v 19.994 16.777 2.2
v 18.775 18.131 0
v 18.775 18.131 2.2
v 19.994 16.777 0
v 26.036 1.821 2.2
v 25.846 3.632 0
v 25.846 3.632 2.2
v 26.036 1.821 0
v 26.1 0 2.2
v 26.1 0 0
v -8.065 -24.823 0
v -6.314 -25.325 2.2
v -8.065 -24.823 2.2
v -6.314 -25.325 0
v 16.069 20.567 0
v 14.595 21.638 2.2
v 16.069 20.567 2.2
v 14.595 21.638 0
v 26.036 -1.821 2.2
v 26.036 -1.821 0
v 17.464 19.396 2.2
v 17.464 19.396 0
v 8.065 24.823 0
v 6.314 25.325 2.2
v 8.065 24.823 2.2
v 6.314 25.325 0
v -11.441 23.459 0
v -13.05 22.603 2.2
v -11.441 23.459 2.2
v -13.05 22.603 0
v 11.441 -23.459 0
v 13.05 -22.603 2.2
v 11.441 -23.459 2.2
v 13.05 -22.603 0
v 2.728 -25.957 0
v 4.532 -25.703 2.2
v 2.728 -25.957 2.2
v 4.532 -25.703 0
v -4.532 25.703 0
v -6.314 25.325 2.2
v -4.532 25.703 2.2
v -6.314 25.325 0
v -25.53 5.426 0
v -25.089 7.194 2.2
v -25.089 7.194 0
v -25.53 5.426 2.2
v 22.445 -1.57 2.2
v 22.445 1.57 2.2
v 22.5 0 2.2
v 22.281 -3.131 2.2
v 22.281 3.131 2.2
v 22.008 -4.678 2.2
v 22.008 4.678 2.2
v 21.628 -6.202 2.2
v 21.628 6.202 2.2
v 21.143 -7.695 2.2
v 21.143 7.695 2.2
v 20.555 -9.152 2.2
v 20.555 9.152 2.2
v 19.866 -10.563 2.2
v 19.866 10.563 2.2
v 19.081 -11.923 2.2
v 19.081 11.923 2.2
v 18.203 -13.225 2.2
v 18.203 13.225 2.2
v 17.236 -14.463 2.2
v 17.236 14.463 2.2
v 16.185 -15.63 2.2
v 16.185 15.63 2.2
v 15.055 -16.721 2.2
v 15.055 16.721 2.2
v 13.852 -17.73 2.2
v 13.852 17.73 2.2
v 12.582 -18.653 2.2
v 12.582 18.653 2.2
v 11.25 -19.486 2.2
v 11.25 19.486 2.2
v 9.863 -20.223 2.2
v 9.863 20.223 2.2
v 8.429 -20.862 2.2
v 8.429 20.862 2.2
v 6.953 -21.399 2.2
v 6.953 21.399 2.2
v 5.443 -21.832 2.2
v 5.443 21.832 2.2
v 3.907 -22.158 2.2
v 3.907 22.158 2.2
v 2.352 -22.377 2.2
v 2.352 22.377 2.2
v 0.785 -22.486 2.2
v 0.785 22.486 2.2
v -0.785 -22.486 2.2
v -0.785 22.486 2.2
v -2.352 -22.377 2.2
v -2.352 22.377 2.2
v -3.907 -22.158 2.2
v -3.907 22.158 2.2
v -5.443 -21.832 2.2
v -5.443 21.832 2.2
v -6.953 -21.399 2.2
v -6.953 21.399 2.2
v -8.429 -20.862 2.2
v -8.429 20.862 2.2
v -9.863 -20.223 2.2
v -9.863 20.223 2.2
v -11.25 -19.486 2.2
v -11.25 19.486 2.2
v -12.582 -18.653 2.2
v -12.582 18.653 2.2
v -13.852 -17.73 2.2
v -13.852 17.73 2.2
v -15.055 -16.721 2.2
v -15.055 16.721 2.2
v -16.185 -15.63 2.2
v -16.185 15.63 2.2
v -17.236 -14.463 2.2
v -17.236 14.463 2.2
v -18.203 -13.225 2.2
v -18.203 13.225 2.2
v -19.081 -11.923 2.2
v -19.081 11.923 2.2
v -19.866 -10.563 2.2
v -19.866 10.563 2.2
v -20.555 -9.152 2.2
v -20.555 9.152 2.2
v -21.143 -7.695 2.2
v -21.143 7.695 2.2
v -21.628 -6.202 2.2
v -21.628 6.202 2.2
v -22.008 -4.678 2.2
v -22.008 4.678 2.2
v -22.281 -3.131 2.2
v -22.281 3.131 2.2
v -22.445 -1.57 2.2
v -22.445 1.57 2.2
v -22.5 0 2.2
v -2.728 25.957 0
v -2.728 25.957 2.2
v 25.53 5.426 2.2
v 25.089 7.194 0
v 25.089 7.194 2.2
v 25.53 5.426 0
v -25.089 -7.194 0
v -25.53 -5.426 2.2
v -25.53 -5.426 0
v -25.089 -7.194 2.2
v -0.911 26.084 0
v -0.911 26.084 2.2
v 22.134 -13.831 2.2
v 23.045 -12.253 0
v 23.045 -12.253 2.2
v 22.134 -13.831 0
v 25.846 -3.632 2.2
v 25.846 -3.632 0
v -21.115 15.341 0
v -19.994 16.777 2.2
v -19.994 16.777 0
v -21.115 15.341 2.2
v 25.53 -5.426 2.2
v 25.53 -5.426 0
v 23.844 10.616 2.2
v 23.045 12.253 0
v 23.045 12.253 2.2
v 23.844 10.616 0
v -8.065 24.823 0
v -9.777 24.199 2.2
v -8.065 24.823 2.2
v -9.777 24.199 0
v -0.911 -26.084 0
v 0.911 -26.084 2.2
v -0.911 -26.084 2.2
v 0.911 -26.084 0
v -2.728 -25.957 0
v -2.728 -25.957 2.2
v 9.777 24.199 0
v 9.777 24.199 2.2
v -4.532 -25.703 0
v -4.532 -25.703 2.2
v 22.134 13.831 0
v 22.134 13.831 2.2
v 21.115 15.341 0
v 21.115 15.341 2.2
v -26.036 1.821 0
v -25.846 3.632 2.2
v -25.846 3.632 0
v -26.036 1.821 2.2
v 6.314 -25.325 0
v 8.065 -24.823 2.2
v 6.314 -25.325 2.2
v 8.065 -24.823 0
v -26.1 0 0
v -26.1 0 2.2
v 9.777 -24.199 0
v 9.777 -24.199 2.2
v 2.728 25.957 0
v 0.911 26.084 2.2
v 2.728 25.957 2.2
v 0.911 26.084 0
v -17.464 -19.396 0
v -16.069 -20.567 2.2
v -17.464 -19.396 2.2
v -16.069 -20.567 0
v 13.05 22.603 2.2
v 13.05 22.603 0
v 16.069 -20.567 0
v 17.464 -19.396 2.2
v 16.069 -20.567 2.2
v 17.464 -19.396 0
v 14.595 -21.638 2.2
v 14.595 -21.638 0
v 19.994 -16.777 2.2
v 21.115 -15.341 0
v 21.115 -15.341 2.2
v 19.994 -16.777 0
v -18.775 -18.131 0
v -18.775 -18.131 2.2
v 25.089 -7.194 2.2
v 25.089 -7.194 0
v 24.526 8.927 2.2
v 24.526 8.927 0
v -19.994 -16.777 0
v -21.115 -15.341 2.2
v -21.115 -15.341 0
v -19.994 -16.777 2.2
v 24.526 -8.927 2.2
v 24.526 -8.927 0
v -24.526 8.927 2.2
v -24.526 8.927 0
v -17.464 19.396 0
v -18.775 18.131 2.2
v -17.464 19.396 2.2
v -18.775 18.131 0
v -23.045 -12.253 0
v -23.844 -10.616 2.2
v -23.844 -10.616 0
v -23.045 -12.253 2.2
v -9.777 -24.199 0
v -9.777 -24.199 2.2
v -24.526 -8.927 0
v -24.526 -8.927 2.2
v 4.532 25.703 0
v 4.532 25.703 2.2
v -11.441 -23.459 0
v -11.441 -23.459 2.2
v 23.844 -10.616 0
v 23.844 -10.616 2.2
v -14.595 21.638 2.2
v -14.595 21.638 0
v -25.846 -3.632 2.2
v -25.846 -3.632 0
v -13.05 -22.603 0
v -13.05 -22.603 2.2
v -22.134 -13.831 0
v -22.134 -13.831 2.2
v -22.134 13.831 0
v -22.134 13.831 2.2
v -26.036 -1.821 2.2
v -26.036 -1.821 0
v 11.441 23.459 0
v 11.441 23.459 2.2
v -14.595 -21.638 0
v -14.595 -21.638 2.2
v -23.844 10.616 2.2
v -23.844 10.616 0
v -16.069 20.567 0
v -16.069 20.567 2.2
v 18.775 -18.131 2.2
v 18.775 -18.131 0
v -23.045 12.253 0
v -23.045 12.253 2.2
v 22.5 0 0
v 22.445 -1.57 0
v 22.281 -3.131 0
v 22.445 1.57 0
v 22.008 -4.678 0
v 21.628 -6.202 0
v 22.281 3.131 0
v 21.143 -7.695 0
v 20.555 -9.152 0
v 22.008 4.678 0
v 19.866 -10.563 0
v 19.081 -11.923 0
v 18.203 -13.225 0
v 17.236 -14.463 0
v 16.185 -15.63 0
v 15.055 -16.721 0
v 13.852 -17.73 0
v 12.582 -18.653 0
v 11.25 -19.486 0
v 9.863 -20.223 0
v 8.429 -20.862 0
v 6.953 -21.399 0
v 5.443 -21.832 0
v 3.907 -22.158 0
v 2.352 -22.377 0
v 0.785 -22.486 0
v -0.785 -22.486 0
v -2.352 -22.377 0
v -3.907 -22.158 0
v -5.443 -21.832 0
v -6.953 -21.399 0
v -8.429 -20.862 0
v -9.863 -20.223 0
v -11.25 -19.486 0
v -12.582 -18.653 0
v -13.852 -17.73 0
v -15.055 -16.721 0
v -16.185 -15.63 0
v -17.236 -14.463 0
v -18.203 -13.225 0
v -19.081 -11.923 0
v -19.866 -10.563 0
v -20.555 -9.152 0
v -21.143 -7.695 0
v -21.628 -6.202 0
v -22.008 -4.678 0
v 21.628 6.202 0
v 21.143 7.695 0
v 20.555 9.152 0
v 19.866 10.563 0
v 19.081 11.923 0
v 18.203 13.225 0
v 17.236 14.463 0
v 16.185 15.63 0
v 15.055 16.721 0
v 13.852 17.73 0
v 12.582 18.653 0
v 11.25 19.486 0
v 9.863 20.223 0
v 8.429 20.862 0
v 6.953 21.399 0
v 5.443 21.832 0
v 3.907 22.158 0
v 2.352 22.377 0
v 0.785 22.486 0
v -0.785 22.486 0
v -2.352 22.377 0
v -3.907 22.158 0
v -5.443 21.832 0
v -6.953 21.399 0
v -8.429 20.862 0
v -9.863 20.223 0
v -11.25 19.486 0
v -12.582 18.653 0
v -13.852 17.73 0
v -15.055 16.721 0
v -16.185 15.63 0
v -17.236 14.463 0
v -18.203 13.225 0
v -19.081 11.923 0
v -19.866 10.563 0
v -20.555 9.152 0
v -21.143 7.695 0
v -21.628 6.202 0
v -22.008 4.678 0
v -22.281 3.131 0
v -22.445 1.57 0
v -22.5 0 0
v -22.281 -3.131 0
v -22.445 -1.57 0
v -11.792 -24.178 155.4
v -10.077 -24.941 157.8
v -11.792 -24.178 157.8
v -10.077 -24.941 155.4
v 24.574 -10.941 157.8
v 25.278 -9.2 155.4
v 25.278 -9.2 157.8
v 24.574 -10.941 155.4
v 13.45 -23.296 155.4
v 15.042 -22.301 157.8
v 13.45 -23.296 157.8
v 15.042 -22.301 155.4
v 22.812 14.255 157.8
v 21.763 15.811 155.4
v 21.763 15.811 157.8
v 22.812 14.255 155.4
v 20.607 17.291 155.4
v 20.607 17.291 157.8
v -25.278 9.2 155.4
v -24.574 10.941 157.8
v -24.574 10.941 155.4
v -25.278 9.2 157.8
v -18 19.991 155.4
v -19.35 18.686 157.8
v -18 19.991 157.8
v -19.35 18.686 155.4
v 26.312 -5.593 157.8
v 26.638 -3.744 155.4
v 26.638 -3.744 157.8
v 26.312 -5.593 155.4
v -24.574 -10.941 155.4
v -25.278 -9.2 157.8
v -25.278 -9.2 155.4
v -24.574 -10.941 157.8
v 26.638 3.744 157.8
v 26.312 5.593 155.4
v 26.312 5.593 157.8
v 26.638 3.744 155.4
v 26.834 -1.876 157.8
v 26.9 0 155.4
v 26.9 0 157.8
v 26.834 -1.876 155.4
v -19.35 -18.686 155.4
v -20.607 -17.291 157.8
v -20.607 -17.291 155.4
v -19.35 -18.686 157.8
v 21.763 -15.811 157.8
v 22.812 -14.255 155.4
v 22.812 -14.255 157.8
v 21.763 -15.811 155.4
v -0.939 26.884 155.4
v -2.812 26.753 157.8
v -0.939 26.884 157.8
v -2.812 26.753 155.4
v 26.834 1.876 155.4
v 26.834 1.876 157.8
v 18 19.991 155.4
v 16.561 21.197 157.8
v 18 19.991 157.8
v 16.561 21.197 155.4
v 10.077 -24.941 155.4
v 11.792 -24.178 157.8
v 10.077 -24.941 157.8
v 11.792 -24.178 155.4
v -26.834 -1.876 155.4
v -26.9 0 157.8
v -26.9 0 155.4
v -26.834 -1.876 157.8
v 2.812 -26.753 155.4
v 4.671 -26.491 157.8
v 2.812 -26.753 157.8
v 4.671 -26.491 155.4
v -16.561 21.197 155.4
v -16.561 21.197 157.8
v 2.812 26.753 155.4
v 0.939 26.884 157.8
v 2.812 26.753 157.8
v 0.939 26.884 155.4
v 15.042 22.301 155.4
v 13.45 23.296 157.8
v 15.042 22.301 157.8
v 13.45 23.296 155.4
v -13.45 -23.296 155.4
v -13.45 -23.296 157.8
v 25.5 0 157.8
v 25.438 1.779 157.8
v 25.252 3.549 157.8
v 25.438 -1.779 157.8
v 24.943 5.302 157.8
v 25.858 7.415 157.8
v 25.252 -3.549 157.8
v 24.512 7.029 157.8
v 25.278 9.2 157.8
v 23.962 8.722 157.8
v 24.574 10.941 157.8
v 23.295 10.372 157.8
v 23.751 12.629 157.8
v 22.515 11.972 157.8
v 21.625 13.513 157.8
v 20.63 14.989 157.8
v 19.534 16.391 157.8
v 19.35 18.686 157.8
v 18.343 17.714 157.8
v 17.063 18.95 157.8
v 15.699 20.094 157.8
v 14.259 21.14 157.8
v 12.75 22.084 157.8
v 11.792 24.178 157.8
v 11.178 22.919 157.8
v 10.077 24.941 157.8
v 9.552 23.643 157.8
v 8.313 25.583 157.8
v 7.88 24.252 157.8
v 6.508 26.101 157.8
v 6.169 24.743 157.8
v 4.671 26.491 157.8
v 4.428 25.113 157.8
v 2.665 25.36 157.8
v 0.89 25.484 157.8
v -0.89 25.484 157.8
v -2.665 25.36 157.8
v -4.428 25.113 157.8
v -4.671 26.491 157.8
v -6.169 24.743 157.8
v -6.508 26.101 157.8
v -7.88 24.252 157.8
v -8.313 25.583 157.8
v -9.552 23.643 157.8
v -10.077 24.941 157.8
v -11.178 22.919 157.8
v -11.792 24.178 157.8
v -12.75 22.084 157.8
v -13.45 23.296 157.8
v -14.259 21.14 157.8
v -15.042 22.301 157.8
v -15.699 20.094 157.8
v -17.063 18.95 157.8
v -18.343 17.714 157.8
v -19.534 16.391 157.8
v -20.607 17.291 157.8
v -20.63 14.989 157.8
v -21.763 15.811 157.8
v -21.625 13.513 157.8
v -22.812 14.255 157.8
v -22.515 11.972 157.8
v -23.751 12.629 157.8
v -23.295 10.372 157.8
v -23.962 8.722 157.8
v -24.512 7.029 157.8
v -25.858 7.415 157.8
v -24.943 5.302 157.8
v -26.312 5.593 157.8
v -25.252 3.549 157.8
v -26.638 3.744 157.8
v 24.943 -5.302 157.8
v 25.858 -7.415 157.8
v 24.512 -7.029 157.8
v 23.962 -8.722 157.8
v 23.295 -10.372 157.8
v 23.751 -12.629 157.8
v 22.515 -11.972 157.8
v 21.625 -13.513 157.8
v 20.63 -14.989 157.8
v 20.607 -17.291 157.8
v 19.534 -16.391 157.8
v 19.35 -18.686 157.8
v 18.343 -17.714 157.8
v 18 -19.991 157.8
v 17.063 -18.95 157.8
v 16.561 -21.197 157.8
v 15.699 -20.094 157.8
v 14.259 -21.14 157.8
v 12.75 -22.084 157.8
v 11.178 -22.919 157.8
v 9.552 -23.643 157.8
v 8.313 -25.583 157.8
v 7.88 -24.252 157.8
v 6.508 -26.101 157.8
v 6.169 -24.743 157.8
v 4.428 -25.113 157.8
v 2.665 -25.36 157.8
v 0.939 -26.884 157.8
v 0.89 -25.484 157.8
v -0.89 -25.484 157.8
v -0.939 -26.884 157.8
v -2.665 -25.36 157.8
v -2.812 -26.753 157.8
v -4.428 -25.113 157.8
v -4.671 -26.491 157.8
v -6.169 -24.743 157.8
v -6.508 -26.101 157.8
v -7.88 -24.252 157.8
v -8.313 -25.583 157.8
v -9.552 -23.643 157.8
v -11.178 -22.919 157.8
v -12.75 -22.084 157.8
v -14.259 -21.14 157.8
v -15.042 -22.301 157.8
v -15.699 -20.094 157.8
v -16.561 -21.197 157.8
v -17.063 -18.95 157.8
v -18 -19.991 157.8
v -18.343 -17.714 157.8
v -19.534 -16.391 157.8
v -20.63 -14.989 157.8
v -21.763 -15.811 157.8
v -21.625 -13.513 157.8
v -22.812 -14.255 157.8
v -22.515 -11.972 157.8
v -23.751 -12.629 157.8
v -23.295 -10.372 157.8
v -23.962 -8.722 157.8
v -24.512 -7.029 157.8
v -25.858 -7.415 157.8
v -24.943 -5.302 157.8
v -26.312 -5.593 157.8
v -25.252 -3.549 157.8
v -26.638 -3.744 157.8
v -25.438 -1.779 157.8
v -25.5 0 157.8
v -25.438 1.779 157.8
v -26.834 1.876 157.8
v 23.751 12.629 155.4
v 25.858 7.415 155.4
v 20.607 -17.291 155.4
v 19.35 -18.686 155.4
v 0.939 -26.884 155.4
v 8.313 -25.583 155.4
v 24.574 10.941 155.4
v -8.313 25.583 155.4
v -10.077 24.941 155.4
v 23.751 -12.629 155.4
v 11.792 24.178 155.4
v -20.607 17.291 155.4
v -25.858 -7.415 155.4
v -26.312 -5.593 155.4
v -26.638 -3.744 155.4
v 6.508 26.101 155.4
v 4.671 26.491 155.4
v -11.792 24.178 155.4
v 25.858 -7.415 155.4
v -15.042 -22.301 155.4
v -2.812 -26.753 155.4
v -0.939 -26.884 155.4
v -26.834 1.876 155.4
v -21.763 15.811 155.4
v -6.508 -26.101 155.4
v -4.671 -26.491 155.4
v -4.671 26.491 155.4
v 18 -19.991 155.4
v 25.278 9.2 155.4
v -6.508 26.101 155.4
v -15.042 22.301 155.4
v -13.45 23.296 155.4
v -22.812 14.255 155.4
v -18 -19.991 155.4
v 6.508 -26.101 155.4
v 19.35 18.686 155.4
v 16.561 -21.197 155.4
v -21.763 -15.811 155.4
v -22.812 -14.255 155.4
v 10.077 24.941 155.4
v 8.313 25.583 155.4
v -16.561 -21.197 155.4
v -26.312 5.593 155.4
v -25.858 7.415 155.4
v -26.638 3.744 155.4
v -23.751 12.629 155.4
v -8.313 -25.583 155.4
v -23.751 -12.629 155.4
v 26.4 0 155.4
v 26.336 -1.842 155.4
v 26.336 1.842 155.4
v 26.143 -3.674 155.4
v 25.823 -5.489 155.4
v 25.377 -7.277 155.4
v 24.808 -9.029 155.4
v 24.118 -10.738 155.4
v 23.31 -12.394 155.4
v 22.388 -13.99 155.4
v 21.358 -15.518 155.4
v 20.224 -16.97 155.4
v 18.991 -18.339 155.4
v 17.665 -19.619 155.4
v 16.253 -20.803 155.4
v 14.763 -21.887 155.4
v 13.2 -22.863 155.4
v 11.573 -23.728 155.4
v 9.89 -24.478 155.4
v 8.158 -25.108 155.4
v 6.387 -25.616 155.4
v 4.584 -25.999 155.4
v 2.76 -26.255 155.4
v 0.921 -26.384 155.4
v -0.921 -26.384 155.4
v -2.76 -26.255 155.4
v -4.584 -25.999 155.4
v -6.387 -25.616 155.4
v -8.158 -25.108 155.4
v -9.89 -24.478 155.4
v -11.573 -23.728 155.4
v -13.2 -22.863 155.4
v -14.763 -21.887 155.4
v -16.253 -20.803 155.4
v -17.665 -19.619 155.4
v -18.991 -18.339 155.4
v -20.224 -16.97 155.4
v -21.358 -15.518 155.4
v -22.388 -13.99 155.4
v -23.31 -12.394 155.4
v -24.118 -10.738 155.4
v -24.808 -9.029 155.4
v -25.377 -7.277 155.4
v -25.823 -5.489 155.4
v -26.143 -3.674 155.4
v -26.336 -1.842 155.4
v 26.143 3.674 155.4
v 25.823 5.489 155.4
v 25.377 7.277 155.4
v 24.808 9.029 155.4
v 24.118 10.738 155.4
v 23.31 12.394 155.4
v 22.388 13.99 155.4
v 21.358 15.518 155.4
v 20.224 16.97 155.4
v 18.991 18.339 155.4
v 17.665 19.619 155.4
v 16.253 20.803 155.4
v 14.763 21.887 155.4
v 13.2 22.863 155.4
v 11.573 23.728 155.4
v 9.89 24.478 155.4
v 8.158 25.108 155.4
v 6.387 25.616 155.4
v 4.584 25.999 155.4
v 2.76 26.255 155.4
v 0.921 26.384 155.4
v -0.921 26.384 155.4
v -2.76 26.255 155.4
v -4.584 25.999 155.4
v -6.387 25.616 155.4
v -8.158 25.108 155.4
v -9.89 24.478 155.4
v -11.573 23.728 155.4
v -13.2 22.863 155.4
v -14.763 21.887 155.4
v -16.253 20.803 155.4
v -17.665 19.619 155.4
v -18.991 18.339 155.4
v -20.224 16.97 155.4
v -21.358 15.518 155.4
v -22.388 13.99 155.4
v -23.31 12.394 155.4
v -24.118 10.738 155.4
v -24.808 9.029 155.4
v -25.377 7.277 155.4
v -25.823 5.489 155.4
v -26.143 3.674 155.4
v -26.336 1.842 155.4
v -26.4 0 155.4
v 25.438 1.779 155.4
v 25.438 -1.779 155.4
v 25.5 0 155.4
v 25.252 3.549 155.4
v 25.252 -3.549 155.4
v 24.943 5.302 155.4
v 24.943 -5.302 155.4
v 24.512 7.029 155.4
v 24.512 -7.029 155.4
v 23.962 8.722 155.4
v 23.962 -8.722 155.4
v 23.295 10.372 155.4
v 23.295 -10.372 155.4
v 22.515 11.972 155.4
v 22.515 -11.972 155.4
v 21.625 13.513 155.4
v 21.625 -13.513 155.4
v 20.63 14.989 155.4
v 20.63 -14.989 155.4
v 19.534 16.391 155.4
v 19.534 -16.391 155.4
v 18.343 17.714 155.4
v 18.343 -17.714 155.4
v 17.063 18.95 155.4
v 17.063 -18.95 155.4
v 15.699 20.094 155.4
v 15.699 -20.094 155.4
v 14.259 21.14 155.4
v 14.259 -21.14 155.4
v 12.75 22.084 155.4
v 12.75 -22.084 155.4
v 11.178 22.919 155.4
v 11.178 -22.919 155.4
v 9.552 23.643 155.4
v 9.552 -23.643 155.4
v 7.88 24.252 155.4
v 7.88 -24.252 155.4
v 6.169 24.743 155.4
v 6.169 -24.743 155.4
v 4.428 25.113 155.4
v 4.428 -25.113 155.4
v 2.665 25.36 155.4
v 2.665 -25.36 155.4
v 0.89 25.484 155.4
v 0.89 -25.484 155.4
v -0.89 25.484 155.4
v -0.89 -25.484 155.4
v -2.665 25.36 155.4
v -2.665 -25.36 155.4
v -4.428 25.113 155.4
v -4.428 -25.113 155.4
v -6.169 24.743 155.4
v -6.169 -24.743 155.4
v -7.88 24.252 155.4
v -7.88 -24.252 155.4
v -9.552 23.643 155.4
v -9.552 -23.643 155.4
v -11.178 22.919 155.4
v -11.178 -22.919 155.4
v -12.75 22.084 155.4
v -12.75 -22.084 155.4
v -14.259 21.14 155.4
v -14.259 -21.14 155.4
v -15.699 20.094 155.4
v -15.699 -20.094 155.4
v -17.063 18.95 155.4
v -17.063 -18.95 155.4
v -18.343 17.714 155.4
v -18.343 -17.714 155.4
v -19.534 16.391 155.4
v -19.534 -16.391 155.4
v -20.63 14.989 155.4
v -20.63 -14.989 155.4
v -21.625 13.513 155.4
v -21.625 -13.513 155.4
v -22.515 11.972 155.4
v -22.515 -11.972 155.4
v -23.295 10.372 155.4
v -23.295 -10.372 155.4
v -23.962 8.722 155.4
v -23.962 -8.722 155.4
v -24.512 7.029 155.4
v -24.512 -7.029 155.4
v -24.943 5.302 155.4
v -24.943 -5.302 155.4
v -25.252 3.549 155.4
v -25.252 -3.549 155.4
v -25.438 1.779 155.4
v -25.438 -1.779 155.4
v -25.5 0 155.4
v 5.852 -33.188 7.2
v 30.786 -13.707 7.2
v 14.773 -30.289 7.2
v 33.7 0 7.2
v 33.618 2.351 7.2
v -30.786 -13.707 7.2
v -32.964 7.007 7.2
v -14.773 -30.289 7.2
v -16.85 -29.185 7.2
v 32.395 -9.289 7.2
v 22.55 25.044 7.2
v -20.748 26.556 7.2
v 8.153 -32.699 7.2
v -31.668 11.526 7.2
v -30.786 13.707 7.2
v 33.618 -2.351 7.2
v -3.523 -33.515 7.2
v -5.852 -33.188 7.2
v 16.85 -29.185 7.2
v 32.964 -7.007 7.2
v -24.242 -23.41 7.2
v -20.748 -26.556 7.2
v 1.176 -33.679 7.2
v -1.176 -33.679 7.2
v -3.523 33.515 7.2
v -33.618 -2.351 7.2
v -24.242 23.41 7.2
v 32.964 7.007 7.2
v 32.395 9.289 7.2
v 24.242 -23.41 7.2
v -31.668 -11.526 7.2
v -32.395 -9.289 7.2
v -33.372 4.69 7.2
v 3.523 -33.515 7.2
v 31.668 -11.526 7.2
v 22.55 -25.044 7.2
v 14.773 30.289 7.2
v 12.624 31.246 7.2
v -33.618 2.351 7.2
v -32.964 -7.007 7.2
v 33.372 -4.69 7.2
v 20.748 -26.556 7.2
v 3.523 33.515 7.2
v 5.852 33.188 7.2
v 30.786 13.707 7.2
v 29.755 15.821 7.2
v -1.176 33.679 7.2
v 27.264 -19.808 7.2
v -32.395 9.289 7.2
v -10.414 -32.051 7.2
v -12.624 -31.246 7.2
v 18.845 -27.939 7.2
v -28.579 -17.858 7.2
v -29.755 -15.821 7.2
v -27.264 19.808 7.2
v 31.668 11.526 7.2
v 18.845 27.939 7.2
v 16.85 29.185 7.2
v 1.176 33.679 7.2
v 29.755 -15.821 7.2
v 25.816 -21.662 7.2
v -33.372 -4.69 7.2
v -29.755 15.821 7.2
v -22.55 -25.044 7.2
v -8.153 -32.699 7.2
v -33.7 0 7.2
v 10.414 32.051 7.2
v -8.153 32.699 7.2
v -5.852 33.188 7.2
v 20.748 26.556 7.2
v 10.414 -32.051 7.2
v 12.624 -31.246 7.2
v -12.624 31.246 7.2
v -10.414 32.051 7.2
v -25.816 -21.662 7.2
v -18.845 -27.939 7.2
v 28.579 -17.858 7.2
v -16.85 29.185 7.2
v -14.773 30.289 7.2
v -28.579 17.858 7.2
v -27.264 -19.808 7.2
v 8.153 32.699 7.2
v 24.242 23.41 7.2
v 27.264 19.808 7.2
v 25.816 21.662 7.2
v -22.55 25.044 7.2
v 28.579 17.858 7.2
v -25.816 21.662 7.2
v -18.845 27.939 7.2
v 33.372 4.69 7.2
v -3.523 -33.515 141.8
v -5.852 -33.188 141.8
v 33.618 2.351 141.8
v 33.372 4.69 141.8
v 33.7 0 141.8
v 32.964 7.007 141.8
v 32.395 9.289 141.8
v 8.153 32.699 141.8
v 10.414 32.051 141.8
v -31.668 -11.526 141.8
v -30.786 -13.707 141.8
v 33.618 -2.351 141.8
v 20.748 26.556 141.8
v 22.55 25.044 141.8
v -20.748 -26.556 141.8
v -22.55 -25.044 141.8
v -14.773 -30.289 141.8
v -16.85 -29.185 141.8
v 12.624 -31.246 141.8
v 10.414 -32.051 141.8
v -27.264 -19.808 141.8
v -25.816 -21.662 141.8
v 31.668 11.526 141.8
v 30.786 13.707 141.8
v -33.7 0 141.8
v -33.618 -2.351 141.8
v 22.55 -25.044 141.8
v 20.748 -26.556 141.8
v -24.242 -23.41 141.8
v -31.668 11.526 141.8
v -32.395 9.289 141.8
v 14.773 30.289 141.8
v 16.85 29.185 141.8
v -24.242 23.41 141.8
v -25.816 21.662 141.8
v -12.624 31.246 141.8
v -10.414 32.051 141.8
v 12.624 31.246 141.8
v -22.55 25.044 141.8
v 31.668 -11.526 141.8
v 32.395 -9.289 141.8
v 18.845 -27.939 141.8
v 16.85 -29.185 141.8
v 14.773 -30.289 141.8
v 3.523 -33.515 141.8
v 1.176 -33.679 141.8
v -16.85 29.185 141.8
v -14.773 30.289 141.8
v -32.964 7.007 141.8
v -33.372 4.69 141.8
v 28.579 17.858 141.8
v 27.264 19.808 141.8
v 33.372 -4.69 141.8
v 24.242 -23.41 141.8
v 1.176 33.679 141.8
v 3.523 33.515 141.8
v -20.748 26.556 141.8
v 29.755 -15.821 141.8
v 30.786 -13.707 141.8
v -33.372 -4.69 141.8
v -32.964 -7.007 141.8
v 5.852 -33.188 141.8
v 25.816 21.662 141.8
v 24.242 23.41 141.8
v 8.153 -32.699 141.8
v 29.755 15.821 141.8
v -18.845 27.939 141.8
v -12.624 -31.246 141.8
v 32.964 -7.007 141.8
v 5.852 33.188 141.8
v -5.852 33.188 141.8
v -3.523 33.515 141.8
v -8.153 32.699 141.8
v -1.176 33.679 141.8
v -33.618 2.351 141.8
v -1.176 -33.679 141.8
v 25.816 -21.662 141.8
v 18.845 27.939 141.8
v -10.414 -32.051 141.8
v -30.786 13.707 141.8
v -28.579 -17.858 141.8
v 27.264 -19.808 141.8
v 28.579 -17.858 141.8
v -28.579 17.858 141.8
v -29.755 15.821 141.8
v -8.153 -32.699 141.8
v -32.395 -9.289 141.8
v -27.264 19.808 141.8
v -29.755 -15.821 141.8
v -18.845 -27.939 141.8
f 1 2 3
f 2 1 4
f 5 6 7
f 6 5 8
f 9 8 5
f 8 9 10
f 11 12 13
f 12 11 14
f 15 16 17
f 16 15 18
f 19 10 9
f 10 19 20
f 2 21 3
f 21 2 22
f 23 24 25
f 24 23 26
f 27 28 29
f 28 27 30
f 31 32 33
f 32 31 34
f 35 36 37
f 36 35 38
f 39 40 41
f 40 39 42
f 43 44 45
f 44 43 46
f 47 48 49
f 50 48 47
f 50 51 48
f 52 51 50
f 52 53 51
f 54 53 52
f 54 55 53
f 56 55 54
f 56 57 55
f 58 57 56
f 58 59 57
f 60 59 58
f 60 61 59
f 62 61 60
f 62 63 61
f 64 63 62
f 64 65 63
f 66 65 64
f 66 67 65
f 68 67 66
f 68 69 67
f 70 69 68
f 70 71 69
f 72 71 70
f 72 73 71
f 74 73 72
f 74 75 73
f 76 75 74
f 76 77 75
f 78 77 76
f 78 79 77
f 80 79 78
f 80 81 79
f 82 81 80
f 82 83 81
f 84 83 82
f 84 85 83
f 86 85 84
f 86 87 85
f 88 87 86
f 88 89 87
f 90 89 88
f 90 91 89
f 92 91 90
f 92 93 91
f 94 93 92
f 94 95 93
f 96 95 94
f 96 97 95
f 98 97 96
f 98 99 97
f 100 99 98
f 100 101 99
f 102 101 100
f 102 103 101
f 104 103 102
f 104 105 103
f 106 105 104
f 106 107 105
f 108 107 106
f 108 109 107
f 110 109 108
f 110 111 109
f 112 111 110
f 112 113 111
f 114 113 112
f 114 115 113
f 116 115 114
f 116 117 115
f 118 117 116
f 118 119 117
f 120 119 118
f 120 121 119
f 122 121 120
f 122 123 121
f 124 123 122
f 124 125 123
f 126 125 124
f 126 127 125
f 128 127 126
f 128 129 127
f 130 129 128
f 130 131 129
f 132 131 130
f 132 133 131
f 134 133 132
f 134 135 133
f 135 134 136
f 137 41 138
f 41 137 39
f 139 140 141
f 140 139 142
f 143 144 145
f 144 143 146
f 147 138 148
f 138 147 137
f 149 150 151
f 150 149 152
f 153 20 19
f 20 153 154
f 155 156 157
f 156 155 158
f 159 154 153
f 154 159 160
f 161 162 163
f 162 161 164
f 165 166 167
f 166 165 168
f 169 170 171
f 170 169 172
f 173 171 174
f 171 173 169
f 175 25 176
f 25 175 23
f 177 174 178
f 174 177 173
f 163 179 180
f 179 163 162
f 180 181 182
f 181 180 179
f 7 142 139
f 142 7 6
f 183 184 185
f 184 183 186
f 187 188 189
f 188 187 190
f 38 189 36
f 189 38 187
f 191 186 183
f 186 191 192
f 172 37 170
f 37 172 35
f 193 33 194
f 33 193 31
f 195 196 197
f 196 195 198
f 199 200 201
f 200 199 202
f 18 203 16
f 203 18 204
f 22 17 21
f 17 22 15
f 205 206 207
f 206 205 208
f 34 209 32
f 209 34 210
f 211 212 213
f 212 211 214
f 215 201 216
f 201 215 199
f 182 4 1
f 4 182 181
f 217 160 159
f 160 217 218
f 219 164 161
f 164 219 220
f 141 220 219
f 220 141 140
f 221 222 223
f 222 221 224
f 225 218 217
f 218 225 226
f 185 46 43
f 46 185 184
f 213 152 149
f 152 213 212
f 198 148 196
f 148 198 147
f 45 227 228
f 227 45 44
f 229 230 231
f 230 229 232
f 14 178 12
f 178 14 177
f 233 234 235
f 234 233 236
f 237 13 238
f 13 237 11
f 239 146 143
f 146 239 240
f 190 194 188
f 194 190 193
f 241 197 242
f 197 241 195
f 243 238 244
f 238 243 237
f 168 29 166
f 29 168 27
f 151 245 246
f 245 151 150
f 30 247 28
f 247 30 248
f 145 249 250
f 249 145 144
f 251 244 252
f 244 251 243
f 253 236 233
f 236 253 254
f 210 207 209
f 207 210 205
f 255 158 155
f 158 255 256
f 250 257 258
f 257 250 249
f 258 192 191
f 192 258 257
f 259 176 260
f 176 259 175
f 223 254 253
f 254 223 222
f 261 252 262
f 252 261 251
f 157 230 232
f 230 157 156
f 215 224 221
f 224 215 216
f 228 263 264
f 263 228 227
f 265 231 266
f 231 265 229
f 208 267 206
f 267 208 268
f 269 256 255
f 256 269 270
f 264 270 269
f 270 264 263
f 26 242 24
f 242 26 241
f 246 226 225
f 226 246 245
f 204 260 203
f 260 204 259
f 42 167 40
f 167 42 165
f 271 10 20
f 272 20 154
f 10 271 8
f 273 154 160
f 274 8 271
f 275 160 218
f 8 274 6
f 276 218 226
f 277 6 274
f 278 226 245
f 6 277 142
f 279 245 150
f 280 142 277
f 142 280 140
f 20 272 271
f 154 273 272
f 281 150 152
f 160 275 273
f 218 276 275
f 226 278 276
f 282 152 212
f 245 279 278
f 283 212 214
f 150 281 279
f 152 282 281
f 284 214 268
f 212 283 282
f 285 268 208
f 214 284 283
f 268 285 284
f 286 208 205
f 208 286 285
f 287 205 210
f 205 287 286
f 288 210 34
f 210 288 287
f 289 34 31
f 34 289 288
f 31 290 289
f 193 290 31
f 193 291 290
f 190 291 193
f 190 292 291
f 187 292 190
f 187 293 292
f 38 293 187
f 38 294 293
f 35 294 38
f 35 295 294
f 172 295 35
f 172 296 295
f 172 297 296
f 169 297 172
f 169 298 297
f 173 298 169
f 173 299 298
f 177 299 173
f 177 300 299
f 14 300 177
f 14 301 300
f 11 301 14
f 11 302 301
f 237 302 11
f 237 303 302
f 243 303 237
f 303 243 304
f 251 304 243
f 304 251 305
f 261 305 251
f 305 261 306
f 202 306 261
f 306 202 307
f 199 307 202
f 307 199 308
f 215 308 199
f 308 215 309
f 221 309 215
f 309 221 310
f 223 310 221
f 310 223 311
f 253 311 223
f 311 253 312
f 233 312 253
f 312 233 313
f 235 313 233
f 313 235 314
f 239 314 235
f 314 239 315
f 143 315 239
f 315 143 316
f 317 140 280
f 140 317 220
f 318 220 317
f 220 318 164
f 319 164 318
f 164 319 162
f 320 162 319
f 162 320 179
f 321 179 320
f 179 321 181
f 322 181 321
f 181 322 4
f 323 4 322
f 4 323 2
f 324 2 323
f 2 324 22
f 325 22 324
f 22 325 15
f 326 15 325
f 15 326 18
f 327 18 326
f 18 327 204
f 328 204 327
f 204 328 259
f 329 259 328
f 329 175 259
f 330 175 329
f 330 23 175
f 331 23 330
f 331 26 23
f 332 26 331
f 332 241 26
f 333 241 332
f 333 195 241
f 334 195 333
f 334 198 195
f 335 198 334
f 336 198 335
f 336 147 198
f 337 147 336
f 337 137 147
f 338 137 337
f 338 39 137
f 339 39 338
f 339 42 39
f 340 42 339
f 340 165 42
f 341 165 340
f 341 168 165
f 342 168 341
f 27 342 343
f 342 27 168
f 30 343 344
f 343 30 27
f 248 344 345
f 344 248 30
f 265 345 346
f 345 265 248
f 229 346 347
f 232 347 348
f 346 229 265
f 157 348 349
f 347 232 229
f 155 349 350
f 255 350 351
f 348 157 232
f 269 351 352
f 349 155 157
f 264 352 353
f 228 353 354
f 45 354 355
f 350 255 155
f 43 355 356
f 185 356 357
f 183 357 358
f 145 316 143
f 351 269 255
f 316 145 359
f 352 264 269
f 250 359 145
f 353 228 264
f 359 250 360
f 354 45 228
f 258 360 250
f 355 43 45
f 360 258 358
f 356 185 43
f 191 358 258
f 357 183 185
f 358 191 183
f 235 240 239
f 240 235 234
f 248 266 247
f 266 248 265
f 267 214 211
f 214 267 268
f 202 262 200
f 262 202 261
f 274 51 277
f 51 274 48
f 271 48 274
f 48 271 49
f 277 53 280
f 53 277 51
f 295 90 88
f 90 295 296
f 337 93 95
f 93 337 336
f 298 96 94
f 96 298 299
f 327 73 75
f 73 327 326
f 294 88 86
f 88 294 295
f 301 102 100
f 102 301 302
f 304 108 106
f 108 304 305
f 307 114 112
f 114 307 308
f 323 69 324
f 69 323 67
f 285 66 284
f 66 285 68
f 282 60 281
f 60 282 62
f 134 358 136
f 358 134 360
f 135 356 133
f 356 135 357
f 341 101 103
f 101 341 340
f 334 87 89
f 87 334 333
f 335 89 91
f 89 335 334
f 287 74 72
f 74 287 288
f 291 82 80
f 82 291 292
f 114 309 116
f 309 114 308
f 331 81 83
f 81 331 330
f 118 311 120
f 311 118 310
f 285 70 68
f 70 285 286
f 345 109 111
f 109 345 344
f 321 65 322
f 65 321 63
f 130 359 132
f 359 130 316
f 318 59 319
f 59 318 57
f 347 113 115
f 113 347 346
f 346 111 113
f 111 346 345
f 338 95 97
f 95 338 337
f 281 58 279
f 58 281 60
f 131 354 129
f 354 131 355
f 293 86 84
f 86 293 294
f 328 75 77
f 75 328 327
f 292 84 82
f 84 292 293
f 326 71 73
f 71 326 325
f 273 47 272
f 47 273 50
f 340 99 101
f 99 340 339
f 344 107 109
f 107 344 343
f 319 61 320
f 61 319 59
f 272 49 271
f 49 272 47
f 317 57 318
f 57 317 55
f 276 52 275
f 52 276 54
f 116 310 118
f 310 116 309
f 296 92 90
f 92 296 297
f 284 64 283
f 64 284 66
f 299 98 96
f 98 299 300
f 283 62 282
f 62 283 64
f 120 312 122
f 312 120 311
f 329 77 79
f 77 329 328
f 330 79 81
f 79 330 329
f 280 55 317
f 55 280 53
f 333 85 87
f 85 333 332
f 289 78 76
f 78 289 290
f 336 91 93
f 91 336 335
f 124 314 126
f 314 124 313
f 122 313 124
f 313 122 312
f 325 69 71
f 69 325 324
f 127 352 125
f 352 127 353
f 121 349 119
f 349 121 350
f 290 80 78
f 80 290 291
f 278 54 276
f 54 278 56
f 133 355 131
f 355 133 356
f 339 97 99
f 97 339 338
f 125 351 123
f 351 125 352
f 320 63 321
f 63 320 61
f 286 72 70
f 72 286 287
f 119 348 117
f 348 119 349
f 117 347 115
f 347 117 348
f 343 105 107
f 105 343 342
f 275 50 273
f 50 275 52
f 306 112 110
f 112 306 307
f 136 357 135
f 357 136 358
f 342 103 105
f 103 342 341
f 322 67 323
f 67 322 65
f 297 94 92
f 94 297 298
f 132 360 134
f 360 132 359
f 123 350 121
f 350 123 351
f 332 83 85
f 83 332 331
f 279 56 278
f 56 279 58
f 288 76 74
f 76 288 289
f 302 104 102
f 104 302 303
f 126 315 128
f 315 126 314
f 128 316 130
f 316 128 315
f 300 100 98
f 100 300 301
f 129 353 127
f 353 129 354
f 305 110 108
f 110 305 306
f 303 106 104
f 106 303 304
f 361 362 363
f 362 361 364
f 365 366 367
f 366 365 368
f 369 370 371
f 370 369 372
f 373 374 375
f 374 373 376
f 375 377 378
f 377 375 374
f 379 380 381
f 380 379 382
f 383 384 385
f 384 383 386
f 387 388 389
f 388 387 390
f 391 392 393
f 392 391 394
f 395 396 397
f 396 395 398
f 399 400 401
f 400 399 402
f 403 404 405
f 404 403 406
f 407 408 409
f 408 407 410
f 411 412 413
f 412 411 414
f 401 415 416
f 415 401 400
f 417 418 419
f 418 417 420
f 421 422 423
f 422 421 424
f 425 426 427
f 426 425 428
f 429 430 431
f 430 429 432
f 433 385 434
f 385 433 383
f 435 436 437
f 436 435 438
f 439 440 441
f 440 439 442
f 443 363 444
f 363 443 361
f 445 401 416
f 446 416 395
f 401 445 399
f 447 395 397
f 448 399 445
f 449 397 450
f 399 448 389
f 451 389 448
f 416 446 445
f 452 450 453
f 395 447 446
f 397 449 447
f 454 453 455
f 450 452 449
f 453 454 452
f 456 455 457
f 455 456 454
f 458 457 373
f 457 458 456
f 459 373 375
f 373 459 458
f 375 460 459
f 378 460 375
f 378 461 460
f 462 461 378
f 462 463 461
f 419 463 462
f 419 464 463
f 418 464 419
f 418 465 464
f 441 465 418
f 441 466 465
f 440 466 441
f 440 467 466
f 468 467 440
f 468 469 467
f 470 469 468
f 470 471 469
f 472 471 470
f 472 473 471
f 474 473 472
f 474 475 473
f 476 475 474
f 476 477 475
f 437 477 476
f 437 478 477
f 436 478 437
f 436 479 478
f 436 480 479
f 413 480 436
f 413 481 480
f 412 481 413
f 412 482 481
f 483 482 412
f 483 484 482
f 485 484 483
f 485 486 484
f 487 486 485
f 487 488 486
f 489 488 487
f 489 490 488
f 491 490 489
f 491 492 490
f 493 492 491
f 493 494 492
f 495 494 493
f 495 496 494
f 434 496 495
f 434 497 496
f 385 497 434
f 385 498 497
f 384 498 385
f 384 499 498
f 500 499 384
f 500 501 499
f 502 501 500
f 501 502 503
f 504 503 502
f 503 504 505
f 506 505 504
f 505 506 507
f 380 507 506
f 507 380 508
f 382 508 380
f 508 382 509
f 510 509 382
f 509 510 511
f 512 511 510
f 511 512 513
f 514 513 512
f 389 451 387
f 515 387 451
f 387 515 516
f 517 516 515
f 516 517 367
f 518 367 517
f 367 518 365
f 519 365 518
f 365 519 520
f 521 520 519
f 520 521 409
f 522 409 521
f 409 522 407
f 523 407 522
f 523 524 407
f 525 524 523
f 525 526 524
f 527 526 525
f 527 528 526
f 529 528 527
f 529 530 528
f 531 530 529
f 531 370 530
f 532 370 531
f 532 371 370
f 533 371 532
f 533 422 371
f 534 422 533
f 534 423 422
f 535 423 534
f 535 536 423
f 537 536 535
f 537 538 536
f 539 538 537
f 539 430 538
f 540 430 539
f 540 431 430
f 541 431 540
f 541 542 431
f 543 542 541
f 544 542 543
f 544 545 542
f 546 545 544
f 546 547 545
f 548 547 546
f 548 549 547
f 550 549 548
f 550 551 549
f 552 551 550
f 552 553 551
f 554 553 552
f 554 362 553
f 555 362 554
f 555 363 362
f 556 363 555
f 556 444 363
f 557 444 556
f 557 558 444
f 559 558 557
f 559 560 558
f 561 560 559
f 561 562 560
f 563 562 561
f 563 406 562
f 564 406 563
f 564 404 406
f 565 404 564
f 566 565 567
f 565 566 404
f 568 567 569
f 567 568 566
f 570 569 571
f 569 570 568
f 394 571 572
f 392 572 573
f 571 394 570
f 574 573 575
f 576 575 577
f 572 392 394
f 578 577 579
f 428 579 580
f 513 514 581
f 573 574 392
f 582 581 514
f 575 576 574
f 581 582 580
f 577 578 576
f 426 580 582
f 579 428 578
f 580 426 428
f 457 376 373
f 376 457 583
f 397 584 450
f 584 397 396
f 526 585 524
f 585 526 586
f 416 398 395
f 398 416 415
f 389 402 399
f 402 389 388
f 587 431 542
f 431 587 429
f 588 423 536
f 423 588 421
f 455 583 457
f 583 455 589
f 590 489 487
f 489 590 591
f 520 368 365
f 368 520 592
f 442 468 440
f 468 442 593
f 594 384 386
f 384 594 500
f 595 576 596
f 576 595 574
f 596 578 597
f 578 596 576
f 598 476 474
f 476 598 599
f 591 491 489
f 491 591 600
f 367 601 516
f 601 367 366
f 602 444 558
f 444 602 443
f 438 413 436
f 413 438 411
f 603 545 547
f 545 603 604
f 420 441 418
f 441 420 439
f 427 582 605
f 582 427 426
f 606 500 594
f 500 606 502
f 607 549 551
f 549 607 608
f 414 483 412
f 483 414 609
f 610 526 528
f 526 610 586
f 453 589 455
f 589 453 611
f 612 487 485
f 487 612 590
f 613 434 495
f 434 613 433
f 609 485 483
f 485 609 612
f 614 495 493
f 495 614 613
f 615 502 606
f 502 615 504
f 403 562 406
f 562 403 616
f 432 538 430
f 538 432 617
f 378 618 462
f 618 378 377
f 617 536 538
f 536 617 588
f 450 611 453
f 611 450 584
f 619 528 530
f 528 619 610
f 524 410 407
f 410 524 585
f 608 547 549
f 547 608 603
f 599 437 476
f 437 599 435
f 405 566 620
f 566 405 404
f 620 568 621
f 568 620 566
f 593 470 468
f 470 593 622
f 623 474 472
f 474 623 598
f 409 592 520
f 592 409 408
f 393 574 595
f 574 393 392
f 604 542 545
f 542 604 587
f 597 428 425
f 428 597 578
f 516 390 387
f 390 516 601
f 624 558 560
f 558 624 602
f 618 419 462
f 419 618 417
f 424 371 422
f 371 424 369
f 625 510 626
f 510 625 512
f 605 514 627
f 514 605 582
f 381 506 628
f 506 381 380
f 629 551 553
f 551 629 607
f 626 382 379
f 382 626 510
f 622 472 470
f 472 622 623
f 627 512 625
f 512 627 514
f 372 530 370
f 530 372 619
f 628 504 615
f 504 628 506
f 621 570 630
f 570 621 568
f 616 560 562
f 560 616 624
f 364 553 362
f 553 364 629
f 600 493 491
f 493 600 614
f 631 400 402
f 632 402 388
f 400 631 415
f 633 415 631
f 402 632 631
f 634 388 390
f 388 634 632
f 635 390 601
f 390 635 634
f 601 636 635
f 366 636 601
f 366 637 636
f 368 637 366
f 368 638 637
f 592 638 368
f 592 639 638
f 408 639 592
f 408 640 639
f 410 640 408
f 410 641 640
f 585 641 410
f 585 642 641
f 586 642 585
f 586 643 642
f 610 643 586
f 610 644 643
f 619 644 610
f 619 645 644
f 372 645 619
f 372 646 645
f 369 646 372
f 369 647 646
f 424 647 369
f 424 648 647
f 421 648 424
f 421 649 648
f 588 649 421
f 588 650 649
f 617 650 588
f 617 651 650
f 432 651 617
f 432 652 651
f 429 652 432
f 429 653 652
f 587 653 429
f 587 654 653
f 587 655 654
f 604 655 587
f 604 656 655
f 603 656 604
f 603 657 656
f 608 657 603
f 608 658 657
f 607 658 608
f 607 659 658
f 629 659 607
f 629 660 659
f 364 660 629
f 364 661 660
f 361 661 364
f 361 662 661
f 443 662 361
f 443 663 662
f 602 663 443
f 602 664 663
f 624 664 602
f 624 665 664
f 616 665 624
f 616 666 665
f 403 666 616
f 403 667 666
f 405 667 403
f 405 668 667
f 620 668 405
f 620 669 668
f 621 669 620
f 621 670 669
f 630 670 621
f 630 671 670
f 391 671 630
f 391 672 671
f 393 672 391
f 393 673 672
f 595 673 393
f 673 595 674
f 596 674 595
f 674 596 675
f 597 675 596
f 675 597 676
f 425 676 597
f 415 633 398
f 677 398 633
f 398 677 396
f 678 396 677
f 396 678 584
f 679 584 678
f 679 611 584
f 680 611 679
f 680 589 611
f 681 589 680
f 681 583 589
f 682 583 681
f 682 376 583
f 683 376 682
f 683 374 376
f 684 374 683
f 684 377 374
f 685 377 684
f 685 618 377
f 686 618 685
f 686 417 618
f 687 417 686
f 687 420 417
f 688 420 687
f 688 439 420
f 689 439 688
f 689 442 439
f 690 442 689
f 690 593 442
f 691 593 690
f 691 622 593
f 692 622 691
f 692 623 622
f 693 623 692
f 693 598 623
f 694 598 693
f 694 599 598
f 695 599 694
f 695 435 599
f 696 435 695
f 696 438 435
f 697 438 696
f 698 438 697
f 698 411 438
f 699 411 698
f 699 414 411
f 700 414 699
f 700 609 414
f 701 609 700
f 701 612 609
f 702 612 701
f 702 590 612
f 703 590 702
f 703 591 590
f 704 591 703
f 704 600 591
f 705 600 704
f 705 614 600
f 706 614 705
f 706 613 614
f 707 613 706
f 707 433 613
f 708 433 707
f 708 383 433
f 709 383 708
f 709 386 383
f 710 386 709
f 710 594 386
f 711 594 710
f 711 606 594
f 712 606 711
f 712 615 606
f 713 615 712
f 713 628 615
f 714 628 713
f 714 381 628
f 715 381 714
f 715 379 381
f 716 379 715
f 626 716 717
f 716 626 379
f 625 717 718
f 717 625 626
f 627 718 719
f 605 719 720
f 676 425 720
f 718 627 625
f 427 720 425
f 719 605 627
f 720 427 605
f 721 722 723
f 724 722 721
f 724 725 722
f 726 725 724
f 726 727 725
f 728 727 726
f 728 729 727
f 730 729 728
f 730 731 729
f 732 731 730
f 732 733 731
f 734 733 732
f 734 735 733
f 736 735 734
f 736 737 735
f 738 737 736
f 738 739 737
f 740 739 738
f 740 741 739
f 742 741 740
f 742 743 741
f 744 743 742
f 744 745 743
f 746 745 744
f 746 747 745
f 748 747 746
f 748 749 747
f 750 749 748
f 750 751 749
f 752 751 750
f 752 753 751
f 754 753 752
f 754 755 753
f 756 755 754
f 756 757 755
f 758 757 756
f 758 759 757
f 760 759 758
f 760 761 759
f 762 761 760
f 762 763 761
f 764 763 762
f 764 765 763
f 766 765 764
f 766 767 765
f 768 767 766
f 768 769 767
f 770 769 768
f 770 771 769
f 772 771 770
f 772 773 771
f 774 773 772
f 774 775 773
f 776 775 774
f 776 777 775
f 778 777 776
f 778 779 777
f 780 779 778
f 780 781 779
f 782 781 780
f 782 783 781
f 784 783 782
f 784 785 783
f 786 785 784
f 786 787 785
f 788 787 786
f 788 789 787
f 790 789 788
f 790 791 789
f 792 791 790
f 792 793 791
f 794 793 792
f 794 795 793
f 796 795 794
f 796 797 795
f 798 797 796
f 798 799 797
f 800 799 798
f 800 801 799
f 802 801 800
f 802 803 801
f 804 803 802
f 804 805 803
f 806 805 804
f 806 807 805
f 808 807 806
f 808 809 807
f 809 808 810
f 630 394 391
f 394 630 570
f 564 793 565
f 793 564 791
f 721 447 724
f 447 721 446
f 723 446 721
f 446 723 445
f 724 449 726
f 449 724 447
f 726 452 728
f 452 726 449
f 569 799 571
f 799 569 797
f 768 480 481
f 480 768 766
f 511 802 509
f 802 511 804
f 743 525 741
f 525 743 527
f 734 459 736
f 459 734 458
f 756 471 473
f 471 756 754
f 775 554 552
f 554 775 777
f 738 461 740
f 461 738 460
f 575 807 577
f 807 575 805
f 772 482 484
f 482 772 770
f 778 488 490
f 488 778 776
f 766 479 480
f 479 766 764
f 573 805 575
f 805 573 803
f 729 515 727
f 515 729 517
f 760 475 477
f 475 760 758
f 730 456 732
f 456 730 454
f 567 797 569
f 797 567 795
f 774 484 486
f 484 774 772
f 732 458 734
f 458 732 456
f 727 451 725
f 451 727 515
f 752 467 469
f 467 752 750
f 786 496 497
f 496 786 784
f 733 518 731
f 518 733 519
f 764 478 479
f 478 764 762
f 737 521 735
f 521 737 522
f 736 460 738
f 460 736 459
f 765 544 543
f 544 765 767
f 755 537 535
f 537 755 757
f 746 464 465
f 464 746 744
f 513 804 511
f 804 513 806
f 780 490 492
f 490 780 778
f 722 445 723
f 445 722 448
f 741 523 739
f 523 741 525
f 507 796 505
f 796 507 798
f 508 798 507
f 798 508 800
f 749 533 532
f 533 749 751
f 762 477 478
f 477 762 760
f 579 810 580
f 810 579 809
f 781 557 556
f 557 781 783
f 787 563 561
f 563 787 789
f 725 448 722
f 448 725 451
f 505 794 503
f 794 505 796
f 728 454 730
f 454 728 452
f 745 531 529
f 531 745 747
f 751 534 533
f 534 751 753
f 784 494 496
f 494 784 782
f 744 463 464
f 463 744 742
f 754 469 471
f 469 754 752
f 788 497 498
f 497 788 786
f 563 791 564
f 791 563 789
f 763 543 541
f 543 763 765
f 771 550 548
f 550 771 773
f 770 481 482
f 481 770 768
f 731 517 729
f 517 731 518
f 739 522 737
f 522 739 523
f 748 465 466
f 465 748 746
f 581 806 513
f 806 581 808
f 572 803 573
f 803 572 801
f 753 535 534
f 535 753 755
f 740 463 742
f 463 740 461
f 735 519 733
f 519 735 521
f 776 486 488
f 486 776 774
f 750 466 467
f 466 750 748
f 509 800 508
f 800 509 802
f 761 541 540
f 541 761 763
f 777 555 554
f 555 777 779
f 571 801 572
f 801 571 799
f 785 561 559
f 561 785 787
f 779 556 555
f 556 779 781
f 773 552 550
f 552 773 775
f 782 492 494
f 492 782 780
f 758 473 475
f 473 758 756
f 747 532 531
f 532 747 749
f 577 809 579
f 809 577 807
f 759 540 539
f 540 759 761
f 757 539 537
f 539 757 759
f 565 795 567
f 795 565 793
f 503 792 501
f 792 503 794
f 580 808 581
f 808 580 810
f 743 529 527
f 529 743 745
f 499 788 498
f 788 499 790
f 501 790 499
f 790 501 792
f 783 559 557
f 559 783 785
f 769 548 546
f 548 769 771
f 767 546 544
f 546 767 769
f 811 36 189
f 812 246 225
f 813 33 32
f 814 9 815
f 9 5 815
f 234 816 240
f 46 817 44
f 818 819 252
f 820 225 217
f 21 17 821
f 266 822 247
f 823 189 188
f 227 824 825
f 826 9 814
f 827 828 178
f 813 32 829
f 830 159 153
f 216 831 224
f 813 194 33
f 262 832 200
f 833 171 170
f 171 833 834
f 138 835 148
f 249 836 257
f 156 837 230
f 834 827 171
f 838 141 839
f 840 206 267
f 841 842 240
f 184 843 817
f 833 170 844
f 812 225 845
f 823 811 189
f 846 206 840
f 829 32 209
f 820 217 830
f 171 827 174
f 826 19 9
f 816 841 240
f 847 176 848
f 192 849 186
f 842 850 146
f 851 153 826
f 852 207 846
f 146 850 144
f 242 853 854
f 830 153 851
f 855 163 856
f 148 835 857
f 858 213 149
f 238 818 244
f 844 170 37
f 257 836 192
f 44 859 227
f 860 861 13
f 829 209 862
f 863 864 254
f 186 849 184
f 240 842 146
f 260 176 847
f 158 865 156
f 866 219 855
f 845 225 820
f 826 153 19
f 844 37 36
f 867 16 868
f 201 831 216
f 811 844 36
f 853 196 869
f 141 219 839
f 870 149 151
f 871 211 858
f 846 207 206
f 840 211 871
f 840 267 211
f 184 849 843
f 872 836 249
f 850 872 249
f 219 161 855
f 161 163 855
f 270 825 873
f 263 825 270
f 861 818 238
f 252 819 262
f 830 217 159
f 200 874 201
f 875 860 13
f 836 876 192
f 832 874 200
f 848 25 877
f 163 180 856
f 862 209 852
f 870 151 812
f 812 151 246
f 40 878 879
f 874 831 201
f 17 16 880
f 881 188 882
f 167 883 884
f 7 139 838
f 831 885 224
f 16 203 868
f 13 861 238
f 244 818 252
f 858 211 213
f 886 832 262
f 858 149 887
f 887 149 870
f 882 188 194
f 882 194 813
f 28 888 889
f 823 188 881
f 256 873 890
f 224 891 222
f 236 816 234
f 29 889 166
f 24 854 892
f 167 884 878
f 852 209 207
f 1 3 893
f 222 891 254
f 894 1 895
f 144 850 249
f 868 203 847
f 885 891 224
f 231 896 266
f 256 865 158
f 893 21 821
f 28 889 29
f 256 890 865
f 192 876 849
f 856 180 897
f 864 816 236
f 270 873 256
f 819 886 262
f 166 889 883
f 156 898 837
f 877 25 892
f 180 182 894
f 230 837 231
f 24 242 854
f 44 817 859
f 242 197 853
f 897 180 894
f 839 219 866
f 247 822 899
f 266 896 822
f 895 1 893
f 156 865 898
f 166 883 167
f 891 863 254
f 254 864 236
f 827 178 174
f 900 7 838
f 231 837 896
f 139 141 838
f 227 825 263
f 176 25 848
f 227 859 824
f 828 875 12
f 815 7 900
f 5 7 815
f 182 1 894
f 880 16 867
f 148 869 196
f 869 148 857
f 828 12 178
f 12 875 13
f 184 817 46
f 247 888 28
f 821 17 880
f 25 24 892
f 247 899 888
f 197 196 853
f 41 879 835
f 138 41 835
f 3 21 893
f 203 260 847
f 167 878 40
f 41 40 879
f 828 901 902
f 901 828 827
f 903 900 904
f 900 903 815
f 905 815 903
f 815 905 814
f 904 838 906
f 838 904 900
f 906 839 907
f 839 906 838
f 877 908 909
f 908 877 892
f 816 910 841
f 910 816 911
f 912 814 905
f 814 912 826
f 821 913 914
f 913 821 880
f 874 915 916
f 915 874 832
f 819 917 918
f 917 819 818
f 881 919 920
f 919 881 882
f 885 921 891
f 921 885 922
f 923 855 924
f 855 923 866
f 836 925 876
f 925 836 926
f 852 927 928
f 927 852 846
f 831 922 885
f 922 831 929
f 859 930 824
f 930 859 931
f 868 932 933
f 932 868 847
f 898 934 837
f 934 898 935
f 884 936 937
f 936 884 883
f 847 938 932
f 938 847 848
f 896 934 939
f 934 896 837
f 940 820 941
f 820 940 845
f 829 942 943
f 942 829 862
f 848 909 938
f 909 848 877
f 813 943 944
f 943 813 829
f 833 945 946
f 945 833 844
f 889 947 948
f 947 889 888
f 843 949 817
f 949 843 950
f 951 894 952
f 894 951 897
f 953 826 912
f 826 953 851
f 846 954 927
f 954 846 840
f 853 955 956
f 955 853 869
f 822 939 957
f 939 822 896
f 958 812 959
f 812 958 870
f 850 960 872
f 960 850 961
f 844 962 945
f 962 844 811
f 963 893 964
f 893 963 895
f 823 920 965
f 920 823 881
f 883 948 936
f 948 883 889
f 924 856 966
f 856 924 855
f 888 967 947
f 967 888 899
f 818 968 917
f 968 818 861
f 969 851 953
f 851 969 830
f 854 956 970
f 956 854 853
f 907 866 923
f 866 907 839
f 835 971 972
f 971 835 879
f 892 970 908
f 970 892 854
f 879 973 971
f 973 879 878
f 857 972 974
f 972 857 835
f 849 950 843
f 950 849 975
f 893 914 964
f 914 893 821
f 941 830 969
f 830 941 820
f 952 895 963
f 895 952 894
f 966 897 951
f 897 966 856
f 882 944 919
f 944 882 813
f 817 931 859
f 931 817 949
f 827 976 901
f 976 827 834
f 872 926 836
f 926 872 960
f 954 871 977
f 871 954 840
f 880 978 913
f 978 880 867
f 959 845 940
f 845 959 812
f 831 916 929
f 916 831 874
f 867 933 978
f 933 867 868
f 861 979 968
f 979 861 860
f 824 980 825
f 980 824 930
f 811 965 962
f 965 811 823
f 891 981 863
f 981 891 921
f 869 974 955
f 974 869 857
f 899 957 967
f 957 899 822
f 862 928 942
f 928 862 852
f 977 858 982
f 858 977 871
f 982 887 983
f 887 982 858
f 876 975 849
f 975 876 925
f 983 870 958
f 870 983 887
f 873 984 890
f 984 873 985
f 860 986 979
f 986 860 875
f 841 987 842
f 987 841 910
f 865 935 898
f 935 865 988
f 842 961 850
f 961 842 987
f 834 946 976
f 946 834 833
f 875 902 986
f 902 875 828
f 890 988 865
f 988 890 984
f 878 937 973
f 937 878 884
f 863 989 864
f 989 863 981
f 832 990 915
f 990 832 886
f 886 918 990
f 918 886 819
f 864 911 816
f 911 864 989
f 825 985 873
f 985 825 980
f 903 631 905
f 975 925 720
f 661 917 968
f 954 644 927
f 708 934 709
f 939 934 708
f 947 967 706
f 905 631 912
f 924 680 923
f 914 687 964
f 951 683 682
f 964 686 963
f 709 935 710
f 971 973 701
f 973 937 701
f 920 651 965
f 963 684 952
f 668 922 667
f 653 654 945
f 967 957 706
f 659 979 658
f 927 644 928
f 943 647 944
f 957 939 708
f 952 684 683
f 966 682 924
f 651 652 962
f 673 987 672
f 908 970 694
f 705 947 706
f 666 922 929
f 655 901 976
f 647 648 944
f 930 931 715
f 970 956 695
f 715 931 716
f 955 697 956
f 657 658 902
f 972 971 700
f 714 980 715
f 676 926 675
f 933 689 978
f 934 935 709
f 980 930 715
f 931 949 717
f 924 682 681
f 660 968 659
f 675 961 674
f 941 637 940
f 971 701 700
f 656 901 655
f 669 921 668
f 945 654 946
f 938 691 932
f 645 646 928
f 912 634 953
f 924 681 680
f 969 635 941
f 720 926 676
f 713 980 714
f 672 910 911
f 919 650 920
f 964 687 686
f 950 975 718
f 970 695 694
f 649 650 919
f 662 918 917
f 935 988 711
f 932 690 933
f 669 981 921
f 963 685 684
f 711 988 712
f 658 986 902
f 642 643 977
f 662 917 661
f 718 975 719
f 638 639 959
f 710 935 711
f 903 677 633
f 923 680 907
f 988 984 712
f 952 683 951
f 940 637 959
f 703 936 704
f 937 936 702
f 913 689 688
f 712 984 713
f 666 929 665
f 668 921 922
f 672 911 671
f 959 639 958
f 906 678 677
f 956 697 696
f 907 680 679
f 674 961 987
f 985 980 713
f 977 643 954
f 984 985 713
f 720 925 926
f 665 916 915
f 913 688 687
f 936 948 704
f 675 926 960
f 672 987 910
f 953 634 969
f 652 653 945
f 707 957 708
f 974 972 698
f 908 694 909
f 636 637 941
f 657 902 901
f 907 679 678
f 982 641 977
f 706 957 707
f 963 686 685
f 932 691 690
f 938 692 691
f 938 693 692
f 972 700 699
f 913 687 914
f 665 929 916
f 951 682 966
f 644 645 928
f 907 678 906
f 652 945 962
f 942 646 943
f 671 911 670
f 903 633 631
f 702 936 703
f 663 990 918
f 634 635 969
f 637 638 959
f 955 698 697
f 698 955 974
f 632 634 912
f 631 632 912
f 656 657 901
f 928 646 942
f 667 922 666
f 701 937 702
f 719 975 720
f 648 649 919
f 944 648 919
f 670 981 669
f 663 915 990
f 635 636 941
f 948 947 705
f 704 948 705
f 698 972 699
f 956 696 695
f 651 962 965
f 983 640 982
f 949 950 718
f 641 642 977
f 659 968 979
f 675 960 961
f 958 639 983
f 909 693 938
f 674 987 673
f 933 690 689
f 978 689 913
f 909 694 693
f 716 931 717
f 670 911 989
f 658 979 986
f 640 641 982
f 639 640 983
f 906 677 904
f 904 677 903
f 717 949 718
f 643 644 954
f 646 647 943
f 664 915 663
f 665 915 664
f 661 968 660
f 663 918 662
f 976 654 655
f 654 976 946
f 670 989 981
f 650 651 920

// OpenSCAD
can_Height = 157.8; //[10:0.1:200]
can_Diameter = 67.4; //[20:0.1:200]
can_Thickness = 0.8; //[0.1:0.1:2]

can_foot_Thinning_Height = 5.0; //[0:0.1:4]
can_foot_Thinning_Diameter = 52.2; //[0:0.1:10]

can_foot_Rim_Height = 2.2; //[0:0.1:4]
can_foot_Rim_Thickness = 3.6; //[0:0.1:6]

can_top_Thinning_Combined_Height = 16; //[0:0.1:30]
can_top_Thinning_Diameter = 52.8; //[0:0.1:100]
can_top_Rim_Diameter = 53.8; //[0:0.1:100]
can_top_Rim_Thickness = 1.4; //[0:0.1:4]
can_top_Rim_Height = 2.4; //[0:0.1:6]

empty = true;

padding = 1;


$fs = 1;
$fa = 4;

union() {
    difference() {
        cylinder(d=can_foot_Thinning_Diameter, h=can_foot_Rim_Height);
        translate([0,0,-padding])
        cylinder(d=can_foot_Thinning_Diameter-2*can_foot_Rim_Thickness, h=can_foot_Rim_Height+2*padding);
    }
    
    translate([0,0,can_foot_Rim_Height])
    cylinder(d1=can_foot_Thinning_Diameter, d2=can_Diameter, h=can_foot_Thinning_Height);
    
    translate([0,0,can_foot_Rim_Height + can_foot_Thinning_Height])
    cylinder(d=can_Diameter, h=can_Height-can_foot_Rim_Height-can_foot_Thinning_Height-can_top_Thinning_Combined_Height);
    
    translate([0,0,can_Height-can_top_Thinning_Combined_Height])
    cylinder(d1=can_Diameter, d2=can_top_Thinning_Diameter, h=can_top_Thinning_Combined_Height-can_top_Rim_Height);
    
    difference() {
        translate([0,0,can_Height-can_top_Rim_Height])
        cylinder(d=can_top_Rim_Diameter, h=can_top_Rim_Height);
        translate([0,0,can_Height-can_top_Rim_Height-padding])
        cylinder(d=can_top_Rim_Diameter-2*can_top_Rim_Thickness, h=can_top_Rim_Height+2*padding);
    }
}
